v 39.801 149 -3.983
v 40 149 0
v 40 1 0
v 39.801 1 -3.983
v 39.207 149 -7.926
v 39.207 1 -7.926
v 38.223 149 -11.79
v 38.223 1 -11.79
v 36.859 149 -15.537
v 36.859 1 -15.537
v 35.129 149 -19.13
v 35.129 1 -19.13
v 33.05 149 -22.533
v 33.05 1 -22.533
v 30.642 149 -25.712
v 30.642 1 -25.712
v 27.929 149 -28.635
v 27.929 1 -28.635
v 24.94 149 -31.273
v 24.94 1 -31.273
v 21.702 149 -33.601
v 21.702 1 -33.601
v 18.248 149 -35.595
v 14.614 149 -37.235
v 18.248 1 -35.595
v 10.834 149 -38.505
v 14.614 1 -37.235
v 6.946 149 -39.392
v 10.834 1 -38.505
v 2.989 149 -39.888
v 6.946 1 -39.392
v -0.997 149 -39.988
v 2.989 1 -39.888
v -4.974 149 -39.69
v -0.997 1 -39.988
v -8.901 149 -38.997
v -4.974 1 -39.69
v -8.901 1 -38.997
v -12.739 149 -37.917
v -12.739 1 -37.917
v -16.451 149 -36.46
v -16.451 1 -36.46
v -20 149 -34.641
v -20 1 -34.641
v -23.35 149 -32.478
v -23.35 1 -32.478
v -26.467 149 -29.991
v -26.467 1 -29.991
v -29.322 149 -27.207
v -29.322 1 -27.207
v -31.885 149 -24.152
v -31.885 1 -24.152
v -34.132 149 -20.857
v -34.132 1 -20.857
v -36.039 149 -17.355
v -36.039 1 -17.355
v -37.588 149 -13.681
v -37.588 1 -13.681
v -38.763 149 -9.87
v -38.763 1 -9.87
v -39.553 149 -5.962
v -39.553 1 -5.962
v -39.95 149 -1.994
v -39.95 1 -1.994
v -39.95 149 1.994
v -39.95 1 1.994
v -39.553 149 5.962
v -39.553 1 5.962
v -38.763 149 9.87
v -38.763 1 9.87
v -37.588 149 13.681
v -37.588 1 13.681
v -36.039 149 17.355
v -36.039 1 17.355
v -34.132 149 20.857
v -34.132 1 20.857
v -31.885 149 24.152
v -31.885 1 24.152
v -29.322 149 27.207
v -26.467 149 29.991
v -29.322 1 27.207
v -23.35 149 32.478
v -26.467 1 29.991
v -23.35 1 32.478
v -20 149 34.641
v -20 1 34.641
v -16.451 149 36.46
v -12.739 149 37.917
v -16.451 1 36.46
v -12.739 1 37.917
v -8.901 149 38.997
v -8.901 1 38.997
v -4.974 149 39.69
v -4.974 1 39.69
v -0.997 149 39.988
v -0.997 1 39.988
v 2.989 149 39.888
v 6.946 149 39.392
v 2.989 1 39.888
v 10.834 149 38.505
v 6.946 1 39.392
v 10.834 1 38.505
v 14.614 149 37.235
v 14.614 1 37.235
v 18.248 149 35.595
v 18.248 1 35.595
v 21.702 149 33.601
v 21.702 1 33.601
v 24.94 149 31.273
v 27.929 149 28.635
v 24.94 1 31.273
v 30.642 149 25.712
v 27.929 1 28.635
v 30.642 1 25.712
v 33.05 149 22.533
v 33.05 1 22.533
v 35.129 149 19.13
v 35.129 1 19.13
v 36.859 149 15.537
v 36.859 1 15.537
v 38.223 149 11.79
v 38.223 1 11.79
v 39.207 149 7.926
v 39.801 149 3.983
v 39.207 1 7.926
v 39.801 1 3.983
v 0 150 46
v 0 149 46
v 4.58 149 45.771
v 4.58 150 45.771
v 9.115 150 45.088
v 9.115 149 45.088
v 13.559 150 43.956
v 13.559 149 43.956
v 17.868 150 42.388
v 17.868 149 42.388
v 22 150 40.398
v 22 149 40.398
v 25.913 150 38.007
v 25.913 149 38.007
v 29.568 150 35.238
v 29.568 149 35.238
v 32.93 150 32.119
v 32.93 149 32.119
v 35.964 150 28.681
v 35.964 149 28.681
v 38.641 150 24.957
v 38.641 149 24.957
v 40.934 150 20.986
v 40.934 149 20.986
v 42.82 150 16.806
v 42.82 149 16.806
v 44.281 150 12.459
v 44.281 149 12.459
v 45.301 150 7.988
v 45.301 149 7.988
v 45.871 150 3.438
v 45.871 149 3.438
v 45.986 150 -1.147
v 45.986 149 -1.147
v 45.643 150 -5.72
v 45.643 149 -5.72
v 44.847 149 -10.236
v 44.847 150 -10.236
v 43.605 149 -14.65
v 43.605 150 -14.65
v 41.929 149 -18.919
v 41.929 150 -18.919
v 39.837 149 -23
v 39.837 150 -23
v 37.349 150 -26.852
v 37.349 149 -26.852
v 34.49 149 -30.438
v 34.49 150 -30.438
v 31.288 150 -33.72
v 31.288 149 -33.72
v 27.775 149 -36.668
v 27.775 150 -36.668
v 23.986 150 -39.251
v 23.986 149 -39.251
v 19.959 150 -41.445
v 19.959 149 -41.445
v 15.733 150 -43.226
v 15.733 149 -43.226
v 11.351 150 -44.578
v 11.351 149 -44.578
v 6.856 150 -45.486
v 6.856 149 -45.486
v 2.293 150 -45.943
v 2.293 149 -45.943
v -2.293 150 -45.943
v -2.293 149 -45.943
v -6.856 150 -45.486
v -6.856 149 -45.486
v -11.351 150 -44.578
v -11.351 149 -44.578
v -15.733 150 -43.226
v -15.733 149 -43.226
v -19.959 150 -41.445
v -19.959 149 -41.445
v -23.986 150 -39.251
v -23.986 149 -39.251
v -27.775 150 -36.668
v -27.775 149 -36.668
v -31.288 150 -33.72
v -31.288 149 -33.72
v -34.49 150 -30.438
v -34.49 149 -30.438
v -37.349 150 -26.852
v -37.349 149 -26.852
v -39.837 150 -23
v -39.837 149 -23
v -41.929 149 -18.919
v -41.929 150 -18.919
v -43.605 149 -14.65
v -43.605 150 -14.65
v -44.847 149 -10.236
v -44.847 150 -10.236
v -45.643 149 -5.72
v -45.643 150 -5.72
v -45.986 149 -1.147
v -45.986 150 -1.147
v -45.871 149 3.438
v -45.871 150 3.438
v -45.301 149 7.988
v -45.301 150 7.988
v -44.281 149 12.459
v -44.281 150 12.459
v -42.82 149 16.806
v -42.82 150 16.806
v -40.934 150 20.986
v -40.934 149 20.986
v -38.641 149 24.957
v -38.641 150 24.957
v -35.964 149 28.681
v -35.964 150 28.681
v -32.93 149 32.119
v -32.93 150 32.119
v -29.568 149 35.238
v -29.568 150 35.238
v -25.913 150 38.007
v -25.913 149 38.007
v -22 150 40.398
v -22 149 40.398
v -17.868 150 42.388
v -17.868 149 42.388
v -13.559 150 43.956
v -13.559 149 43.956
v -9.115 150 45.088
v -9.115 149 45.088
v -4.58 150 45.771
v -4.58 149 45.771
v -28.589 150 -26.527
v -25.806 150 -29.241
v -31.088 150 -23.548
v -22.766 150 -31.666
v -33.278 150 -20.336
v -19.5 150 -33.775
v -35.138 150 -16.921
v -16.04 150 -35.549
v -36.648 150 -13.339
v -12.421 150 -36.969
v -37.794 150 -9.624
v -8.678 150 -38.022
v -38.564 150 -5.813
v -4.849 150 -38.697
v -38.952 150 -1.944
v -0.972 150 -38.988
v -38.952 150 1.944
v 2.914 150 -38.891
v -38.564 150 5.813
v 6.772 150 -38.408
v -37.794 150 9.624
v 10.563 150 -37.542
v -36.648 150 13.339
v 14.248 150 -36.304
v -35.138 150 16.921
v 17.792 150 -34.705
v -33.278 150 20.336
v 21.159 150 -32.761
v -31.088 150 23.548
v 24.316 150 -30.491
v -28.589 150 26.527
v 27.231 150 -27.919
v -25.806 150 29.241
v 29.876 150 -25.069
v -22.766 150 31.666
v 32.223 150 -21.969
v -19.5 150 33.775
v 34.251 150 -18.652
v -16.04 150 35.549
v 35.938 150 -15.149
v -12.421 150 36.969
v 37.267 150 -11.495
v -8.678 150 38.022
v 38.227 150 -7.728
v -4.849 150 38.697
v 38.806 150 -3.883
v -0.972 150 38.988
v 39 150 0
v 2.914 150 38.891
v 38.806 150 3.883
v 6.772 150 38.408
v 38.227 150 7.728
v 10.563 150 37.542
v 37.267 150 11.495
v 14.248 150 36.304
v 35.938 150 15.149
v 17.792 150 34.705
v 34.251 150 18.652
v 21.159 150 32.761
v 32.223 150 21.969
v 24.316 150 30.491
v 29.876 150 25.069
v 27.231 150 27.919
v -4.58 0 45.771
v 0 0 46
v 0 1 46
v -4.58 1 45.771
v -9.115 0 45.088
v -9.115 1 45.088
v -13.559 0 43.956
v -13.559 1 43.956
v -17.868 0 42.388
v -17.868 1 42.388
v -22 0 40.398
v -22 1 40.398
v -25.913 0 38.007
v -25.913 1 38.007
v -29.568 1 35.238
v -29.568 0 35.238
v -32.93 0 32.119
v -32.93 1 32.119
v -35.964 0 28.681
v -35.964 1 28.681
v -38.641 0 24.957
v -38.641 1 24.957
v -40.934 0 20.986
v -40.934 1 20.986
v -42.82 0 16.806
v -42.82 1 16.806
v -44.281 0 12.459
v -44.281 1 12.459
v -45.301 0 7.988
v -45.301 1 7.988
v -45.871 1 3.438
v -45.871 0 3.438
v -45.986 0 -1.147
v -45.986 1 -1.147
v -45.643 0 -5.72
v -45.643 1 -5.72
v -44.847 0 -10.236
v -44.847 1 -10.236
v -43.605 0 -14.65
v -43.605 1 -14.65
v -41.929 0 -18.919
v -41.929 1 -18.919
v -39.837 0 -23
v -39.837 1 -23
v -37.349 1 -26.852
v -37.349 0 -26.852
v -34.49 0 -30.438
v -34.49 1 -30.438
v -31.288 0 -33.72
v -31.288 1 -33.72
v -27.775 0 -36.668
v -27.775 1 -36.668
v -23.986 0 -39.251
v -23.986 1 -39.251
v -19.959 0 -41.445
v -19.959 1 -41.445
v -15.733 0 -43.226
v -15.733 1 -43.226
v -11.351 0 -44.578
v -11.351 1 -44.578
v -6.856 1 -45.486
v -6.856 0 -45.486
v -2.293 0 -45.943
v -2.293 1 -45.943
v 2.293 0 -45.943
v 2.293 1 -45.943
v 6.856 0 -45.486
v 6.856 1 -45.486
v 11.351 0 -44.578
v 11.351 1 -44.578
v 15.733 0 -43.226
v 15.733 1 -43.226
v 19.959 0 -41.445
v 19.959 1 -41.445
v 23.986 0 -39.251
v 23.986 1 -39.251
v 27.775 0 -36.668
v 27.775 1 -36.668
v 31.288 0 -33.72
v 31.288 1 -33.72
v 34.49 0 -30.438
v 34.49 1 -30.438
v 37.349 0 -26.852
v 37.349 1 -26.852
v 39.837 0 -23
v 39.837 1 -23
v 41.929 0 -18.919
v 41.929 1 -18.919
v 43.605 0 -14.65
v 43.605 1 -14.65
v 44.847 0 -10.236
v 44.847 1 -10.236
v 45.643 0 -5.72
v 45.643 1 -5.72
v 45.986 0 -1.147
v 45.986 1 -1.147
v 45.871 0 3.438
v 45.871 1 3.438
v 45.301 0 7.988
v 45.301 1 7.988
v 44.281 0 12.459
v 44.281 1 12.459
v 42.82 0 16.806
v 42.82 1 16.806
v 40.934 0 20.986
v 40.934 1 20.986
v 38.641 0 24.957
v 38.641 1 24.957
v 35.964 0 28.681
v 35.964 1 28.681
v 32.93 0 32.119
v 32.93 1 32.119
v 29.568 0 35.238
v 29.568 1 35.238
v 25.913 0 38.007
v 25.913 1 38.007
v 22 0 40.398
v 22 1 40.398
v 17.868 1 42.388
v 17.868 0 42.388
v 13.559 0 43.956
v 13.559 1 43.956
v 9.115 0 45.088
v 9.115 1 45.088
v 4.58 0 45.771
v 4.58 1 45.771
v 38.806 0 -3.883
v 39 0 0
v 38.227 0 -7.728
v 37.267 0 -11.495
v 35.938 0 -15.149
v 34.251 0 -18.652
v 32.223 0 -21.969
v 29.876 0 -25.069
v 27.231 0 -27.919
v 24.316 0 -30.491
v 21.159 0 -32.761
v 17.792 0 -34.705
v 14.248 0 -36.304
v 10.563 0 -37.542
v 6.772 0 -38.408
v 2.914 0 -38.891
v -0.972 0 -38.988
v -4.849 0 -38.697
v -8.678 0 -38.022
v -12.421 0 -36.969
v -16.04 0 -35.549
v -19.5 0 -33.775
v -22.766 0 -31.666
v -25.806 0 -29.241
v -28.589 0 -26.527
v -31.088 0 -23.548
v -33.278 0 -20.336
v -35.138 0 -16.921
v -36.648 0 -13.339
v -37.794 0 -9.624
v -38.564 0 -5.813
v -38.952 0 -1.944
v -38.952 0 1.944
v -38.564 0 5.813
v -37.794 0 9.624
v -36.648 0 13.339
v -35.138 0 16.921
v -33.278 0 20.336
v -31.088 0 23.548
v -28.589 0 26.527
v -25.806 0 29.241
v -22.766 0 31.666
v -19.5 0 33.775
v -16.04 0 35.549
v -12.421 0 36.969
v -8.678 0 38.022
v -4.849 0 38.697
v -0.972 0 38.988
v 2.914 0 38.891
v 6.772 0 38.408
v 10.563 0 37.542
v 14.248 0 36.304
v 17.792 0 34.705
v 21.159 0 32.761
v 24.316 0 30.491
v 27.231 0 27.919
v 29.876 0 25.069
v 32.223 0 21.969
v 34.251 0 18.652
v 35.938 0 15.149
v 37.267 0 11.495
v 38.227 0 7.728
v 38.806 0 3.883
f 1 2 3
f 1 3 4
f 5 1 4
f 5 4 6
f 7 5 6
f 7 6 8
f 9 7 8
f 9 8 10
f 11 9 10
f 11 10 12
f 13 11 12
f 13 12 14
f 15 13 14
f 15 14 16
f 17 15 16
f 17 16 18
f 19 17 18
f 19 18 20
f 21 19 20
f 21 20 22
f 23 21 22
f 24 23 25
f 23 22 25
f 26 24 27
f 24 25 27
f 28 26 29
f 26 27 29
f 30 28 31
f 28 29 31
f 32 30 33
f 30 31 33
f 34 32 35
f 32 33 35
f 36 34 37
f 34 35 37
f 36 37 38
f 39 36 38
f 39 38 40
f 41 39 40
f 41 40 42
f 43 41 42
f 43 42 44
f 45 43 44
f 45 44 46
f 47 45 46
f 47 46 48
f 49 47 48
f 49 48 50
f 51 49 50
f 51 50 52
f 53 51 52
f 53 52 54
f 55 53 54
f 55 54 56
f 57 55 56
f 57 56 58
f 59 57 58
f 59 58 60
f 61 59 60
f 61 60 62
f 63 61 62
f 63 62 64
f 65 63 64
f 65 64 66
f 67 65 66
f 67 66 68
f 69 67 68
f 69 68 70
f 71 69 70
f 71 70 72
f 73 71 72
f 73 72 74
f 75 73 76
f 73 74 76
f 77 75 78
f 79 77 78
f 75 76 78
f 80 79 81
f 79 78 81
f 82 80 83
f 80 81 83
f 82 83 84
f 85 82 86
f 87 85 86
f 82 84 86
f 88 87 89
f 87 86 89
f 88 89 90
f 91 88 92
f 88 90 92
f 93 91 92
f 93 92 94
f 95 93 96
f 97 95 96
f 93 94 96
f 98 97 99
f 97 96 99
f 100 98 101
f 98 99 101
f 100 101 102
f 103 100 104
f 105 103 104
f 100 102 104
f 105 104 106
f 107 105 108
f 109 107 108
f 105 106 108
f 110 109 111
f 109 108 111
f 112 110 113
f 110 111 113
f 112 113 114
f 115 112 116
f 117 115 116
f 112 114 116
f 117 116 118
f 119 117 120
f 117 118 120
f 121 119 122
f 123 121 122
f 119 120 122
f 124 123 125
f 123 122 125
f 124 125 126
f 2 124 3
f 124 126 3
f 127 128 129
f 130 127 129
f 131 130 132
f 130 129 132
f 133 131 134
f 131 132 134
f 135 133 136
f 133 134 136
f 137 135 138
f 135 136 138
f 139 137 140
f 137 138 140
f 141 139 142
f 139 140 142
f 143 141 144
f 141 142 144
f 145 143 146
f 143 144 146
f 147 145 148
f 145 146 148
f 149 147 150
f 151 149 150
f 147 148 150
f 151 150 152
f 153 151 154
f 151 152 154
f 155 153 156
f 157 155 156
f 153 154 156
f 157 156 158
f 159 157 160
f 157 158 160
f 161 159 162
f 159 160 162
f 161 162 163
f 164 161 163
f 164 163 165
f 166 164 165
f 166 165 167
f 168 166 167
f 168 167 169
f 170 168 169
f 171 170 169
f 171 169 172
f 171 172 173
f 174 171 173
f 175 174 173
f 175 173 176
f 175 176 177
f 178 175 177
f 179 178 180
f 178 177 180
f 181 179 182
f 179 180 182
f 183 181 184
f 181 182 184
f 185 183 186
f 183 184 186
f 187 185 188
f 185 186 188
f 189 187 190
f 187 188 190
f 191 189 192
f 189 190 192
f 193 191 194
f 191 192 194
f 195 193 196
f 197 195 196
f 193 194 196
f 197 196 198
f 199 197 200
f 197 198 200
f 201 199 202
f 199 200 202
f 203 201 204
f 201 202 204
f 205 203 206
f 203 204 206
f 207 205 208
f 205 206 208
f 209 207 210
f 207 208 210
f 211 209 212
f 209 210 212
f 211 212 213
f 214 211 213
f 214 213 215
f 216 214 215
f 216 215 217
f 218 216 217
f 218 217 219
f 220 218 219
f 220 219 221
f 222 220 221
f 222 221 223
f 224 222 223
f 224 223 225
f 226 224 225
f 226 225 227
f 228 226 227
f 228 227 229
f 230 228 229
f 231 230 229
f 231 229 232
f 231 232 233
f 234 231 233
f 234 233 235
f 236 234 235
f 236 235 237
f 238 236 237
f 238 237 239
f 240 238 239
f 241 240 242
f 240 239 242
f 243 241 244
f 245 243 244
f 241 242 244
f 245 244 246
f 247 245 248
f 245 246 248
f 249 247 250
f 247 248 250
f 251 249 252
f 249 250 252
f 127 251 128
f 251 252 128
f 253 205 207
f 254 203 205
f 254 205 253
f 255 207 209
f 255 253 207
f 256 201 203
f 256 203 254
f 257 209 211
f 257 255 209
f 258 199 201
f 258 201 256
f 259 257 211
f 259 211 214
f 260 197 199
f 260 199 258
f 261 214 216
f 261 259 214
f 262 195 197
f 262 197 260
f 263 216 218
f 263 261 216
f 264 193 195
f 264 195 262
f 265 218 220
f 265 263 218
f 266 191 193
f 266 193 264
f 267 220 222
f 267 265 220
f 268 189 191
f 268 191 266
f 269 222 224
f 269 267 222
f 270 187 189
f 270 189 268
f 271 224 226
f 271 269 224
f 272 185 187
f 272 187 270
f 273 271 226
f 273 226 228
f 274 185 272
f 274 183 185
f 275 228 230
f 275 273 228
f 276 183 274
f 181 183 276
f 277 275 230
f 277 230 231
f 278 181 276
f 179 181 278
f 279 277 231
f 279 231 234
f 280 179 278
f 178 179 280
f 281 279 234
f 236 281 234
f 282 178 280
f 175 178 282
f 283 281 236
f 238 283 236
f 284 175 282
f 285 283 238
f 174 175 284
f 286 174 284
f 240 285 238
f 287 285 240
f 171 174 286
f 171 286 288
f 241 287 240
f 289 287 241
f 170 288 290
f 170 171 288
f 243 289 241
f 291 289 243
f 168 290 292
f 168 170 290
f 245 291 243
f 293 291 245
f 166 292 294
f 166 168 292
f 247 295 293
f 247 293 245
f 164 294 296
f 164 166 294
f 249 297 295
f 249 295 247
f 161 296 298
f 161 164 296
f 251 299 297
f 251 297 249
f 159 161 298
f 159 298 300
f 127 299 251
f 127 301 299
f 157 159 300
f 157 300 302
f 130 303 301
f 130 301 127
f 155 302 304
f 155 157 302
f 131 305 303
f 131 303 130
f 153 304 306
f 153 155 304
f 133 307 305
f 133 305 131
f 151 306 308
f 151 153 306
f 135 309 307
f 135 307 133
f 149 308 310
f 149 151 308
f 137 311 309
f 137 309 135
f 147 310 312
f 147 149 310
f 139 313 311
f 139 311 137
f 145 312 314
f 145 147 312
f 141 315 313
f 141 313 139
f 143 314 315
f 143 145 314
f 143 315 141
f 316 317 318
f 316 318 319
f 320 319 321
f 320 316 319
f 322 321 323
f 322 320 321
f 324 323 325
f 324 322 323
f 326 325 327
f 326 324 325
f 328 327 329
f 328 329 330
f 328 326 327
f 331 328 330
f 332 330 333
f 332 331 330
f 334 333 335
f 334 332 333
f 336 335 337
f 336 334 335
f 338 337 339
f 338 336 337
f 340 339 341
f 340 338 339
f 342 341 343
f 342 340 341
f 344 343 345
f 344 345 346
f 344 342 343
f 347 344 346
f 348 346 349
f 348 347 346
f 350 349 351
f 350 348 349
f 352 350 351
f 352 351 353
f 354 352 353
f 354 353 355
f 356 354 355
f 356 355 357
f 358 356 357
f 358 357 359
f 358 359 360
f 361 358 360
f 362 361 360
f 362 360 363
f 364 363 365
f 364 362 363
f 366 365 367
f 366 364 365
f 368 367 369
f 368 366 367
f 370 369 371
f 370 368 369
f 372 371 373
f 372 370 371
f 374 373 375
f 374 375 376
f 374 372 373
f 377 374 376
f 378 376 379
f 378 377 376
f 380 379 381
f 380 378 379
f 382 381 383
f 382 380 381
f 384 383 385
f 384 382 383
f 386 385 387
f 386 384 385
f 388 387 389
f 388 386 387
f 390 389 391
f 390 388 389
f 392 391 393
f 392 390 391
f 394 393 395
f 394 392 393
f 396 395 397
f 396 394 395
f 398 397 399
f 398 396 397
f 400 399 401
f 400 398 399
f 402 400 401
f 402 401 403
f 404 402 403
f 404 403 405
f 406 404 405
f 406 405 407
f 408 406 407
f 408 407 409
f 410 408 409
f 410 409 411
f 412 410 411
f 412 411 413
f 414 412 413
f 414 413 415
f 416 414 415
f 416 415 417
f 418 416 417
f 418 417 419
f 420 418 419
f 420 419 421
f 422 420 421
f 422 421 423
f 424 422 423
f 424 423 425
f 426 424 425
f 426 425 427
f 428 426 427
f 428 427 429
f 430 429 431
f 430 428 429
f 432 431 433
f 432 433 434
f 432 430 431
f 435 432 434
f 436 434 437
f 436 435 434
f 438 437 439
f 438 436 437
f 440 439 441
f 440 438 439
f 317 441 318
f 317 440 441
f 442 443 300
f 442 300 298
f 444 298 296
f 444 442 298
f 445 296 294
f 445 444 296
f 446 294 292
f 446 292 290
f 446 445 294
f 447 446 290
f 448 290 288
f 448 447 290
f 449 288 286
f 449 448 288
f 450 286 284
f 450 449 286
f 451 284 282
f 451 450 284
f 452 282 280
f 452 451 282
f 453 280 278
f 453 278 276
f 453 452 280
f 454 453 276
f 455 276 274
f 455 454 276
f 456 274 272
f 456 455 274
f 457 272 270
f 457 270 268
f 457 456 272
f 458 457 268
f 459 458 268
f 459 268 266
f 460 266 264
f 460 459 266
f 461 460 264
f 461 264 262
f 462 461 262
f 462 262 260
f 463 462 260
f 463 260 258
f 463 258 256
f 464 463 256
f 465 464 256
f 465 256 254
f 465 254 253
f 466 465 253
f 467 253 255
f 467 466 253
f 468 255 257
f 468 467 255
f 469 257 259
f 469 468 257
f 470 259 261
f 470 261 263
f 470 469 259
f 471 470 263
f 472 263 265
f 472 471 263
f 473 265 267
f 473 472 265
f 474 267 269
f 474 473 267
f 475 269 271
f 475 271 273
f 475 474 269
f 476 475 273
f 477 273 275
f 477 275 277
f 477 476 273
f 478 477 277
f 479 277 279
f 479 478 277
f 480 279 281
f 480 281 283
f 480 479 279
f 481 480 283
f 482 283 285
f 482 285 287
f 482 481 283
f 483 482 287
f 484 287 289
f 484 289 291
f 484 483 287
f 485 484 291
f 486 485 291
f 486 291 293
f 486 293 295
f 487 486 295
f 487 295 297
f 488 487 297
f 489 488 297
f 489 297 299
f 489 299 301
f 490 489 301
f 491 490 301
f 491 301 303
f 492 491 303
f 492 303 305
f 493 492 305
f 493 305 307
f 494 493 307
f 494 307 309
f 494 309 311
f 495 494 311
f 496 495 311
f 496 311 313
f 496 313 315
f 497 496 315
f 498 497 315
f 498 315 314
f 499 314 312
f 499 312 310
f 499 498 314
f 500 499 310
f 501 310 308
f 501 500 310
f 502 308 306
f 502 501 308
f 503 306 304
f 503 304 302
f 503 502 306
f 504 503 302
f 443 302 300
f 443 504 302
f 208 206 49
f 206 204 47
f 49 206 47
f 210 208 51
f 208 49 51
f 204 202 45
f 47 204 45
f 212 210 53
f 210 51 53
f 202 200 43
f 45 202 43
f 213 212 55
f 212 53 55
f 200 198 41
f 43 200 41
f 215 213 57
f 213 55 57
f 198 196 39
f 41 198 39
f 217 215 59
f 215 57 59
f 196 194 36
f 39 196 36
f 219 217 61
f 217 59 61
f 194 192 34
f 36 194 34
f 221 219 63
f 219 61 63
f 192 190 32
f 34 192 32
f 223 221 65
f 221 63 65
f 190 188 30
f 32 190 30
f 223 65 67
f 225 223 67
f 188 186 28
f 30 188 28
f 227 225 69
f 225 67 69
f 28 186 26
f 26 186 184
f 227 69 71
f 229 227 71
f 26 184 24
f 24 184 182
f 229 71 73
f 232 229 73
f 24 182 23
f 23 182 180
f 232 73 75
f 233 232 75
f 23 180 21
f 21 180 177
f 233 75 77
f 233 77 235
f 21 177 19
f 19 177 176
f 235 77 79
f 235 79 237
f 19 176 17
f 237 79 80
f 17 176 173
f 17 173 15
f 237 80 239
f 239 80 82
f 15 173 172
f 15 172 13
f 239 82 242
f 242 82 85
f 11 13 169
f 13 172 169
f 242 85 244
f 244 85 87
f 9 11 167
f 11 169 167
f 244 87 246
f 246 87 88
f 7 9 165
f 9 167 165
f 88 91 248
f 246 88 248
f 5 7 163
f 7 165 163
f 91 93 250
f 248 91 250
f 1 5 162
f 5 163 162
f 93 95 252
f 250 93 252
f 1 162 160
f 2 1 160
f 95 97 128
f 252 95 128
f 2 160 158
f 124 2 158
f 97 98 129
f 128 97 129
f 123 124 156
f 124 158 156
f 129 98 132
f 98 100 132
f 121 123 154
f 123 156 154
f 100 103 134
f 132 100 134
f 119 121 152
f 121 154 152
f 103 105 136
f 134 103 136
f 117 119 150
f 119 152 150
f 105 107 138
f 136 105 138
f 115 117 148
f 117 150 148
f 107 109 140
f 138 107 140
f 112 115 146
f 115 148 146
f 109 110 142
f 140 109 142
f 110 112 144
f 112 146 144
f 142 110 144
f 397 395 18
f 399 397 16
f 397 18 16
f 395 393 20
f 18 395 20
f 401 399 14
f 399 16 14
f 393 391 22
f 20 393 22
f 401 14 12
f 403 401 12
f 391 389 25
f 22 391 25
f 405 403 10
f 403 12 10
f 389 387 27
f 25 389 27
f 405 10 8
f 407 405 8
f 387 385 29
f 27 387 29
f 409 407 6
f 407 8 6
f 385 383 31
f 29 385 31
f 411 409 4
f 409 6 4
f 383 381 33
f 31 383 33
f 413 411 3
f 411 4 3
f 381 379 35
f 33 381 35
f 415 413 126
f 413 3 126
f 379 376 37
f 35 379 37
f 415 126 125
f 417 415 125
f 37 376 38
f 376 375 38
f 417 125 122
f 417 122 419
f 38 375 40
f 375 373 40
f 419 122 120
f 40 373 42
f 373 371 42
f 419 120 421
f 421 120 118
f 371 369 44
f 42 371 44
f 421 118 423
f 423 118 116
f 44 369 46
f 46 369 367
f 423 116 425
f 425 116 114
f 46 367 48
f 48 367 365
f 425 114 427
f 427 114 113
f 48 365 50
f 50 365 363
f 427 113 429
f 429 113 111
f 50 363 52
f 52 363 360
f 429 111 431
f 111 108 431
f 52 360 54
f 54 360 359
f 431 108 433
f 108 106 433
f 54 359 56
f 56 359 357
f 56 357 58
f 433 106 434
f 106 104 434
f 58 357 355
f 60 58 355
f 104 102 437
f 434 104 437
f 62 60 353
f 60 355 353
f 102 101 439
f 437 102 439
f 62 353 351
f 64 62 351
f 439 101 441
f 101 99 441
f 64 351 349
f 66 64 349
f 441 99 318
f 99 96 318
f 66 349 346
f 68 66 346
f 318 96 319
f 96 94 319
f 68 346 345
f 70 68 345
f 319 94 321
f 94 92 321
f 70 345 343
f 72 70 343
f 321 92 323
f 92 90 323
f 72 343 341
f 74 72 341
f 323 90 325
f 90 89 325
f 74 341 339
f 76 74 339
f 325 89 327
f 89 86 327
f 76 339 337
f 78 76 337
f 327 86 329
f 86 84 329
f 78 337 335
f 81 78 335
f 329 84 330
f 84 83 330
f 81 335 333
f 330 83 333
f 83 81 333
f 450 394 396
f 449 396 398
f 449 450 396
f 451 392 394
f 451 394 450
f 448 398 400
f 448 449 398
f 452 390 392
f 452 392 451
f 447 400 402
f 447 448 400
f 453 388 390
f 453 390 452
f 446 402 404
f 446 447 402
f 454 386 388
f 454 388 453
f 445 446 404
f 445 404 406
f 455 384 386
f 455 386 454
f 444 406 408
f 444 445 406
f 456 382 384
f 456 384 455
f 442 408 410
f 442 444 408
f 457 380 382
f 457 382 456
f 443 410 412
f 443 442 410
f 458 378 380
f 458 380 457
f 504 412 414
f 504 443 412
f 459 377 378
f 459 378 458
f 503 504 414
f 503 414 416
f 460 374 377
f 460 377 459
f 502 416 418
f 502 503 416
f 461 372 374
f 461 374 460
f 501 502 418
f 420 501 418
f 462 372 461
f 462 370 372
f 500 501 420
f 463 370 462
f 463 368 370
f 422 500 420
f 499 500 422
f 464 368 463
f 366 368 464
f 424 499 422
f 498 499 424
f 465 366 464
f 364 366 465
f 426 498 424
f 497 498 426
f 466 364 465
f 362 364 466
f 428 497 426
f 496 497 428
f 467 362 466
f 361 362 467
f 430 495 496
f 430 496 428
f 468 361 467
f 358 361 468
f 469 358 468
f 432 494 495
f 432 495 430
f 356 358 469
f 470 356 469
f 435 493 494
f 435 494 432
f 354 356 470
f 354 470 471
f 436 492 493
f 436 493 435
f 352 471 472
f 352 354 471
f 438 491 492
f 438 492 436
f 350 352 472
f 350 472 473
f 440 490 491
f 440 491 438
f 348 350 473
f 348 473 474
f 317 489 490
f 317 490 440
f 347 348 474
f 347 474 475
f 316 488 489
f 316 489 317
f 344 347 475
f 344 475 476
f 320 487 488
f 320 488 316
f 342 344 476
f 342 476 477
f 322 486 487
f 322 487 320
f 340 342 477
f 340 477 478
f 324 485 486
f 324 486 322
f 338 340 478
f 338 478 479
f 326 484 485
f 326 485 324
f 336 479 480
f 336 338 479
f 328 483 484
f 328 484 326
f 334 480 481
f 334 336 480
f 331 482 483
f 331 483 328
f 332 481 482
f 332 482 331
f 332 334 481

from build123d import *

# Parameters (mm, degrees)
SCHIZZO1_R                   = 40
SCHIZZO1_R_2                 = 39
ESTRUSIONE_SOTTILE1_DEPTH    = 150
ESTRUSIONE_ESTRUSIONE1_START = -1
SCHIZZO2_R                   = 46
SCHIZZO2_R_2                 = 40
ESTRUSIONE_ESTRUSIONE1_DEPTH = 1
SCHIZZO3_R                   = 46
SCHIZZO3_R_2                 = 40
ESTRUSIONE_ESTRUSIONE2_DEPTH = 1


with BuildPart() as part:
    # Schizzo1 → Estrusione-Sottile1 (new body)
    with BuildSketch(Plane(origin=(0, 0, 0), x_dir=(1, 0, 0), z_dir=(0, 1, 0))):
        Circle(SCHIZZO1_R)
        Circle(SCHIZZO1_R_2, mode=Mode.SUBTRACT)
    extrude(amount=ESTRUSIONE_SOTTILE1_DEPTH)

    # Schizzo2 → Estrusione-Estrusione1 (add)
    with BuildSketch(Plane(origin=(0, 150, 0), x_dir=(1, 0, 0), z_dir=(0, 1, 0)).offset(ESTRUSIONE_ESTRUSIONE1_START)):
        with Locations(Location((0, 0, 0), (0, 0, 270))):
            Circle(SCHIZZO2_R)
        with Locations(Location((0, 0, 0), (0, 0, 270))):
            Circle(SCHIZZO2_R_2, mode=Mode.SUBTRACT)
    extrude(amount=ESTRUSIONE_ESTRUSIONE1_DEPTH)

    # Schizzo3 → Estrusione-Estrusione2 (add)
    with BuildSketch(Plane.XZ):
        with Locations(Location((0, 0, 0), (0, 0, 90))):
            Circle(SCHIZZO3_R)
        with Locations(Location((0, 0, 0), (0, 0, 270))):
            Circle(SCHIZZO3_R_2, mode=Mode.SUBTRACT)
    extrude(amount=-ESTRUSIONE_ESTRUSIONE2_DEPTH)


solid = part.part
